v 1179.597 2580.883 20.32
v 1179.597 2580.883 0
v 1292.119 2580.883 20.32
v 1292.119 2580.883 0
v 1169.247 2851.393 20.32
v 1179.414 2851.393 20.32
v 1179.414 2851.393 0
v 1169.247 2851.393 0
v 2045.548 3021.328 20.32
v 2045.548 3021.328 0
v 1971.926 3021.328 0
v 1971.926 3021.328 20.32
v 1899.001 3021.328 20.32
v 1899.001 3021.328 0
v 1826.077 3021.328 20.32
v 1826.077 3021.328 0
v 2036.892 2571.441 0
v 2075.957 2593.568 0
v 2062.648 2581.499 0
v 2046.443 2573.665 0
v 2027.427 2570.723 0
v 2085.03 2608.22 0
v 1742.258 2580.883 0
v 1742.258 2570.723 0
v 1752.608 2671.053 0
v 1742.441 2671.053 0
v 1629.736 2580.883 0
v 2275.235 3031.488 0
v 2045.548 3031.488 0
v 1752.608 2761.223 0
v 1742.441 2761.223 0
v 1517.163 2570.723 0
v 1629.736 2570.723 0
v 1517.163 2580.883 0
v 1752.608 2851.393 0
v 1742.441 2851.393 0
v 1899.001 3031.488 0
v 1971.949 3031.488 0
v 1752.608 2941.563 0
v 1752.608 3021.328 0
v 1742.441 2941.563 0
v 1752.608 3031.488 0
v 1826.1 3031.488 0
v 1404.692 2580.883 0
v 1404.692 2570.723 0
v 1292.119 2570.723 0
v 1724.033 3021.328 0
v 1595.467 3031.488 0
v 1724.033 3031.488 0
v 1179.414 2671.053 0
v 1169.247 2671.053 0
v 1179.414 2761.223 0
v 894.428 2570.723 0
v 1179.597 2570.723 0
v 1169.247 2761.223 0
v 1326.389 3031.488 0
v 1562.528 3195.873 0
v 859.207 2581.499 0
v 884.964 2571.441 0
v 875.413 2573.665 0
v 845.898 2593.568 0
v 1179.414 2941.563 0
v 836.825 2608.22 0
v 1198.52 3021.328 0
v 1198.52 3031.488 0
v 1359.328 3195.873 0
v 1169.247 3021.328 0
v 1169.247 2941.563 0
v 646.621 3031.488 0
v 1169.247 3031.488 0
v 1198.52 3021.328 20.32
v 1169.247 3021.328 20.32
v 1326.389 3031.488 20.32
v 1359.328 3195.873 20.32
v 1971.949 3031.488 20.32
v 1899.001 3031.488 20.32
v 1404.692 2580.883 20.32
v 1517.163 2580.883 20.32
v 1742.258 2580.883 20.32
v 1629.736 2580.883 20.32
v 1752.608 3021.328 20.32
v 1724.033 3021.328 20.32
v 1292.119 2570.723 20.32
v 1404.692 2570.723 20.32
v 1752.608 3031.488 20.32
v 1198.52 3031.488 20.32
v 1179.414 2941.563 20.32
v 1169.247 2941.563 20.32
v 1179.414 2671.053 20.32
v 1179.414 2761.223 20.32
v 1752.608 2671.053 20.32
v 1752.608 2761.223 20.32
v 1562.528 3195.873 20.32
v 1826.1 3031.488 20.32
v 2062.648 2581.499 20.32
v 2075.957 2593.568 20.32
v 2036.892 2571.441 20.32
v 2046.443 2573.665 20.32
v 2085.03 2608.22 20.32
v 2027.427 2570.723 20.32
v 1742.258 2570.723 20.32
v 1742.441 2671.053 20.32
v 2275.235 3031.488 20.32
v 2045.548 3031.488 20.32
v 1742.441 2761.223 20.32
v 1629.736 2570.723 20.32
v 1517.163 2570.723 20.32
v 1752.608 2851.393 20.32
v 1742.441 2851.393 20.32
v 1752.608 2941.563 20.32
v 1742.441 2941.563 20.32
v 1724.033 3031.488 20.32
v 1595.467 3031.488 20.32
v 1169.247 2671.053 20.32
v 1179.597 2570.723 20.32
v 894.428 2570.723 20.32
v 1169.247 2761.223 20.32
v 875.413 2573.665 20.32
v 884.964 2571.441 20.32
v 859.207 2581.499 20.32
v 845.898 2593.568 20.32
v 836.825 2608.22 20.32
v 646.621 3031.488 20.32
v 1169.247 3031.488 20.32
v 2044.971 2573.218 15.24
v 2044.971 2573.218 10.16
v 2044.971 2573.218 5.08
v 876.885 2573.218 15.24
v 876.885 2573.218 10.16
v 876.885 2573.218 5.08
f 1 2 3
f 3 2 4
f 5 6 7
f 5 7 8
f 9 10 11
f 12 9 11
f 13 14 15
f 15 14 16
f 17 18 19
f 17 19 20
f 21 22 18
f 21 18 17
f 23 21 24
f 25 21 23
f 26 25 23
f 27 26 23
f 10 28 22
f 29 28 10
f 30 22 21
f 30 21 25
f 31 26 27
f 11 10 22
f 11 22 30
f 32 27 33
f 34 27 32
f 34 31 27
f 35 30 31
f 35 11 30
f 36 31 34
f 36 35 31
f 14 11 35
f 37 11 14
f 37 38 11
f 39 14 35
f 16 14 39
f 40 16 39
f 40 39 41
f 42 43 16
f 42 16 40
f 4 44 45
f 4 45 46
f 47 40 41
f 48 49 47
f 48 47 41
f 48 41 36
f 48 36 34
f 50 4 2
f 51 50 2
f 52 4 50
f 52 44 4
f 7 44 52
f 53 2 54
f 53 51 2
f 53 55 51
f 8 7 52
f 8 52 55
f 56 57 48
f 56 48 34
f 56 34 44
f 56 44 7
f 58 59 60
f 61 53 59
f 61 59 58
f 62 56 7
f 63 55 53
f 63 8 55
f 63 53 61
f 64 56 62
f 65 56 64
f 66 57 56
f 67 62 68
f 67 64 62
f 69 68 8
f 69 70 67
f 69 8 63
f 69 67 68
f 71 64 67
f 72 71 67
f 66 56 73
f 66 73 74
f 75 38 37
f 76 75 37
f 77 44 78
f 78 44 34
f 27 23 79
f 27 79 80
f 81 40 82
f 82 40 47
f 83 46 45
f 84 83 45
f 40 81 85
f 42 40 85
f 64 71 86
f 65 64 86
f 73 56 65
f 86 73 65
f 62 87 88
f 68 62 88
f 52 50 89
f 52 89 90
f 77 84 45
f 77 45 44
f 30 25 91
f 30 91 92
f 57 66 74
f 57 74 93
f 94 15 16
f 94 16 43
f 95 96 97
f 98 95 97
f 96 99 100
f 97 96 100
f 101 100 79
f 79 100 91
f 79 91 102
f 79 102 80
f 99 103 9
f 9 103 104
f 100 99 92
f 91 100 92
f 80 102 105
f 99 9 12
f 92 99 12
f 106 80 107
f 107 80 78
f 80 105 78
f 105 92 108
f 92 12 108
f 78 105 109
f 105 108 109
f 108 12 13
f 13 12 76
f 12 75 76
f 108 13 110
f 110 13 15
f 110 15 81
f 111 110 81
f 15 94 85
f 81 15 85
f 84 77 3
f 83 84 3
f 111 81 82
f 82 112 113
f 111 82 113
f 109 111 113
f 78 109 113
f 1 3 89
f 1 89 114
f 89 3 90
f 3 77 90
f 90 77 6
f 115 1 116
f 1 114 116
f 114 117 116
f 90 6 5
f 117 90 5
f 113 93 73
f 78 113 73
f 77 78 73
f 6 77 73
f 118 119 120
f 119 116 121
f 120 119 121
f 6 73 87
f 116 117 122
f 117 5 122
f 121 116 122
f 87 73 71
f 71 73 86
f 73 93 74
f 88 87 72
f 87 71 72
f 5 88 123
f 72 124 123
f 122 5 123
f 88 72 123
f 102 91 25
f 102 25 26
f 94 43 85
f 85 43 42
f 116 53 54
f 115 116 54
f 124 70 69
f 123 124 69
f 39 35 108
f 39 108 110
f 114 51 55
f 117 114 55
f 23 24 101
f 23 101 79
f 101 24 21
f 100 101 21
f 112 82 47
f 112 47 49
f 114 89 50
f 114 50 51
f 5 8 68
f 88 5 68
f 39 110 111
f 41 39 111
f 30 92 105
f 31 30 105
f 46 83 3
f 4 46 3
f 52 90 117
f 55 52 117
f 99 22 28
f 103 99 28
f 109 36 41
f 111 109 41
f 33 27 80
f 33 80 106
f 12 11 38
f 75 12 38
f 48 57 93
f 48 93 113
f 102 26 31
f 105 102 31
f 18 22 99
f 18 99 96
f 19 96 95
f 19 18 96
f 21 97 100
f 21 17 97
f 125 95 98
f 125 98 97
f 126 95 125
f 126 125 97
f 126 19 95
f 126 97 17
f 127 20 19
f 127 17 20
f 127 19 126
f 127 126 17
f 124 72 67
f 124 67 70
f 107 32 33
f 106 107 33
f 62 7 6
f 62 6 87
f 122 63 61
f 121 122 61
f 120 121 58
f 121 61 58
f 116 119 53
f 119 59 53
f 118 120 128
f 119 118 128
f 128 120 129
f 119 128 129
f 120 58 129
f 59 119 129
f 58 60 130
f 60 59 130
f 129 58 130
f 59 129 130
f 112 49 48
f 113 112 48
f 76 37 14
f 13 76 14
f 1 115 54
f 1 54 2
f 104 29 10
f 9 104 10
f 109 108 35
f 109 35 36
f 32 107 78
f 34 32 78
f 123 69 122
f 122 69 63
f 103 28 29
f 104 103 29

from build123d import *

# Parameters (mm, degrees)
BOSS_EXTRUDE1_DEPTH      = 20.32
CUT_EXTRUDE1_START       = -20.32
CUT_EXTRUDE1_OUTLINE_W   = 112.522
CUT_EXTRUDE1_OUTLINE_H   = 10.16
CUT_EXTRUDE1_OUTLINE_W_2 = 112.4712
CUT_EXTRUDE1_DEPTH       = 20.32
SKETCH3_W                = 10.166490401
SKETCH3_H                = 90.17
SKETCH3_W_2              = 29.273269095
SKETCH3_H_2              = 10.16
SKETCH3_W_3              = 28.575
CUT_EXTRUDE2_DEPTH       = 1125.982


# Read off the part's stored shape, not the designer's step: Cut-Extrude1
with BuildPart() as part:
    # Sketch1 → Boss-Extrude1 (new body)
    with BuildSketch(Plane.XY):
        Polygon((1595.466660195, 3031.488204655), (1326.388576611, 3031.488204655), (1359.327618403, 3195.873483514), (1562.527618403, 3195.873483514), align=None)
        with BuildLine():
            Line((894.428066471, 2570.722953846), (2027.427046989, 2570.722953846))
            add(Edge.make_bspline(
                [(2085.030207364, 2608.219614395), (2082.704936523, 2602.979434666), (2079.555914944, 2597.842123597), (2071.701679737, 2588.506915395), (2066.997802899, 2584.31975945), (2056.553975566, 2577.521356648), (2050.823670006, 2574.916388157), (2039.117489861, 2571.518756347), (2033.151956819, 2570.722953846), (2027.427046989, 2570.722953846)],
                knots=[0, 0, 0, 0, 0.25, 0.25, 0.5, 0.5, 0.75, 0.75, 1, 1, 1, 1], degree=3))
            Line((2085.030207364, 2608.219614395), (2275.234550162, 3031.488204655))
            Line((2275.234550162, 3031.488204655), (646.620686644, 3031.488204655))
            Line((646.620686644, 3031.488204655), (836.825029442, 2608.219614395))
            add(Edge.make_bspline(
                [(836.825029442, 2608.219614395), (839.150300283, 2602.979434666), (842.299321863, 2597.842123597), (850.153557069, 2588.506915395), (854.857433907, 2584.31975945), (865.30126124, 2577.521356648), (871.0315668, 2574.916388157), (882.737746945, 2571.518756347), (888.703279987, 2570.722953846), (894.428066471, 2570.722953846)],
                knots=[0, 0, 0, 0, 0.25, 0.25, 0.5, 0.5, 0.75, 0.75, 1, 1, 1, 1], degree=3))
        make_face()
    extrude(amount=BOSS_EXTRUDE1_DEPTH)

    # Cut-Extrude1 outline → Cut-Extrude1 (cut)
    with BuildSketch(Plane.XY.offset(20.32).offset(CUT_EXTRUDE1_START)):
        Polygon((1629.735958734, 2580.882920539), (1629.73595673, 2570.722953846), (1742.25795673, 2570.722953846), (1742.257958734, 2580.882898338), align=None)
        with Locations((1235.85815673, 2575.802953846)):
            Rectangle(CUT_EXTRUDE1_OUTLINE_W, CUT_EXTRUDE1_OUTLINE_H)
        with Locations((1460.92755673, 2575.802953846)):
            Rectangle(CUT_EXTRUDE1_OUTLINE_W_2, CUT_EXTRUDE1_OUTLINE_H)
    extrude(amount=CUT_EXTRUDE1_DEPTH, mode=Mode.SUBTRACT)

    # Sketch3 → Cut-Extrude2 (cut)
    with BuildSketch(Plane(origin=(0, 0, 0), x_dir=(-1, 0, 0), z_dir=(0, 0, -1))):
        with Locations((-1174.33046881, 2716.137953846)):
            Rectangle(SKETCH3_W, SKETCH3_H)
        with Locations((-1174.33046881, 2896.477953846)):
            Rectangle(SKETCH3_W, SKETCH3_H)
        with Locations((-1183.883858158, 3026.408204655)):
            Rectangle(SKETCH3_W_2, SKETCH3_H_2)
        with Locations((-1738.320389849, 3026.408204655)):
            Rectangle(SKETCH3_W_3, SKETCH3_H_2)
        with Locations((-1747.524644649, 2896.477953846)):
            Rectangle(SKETCH3_W, SKETCH3_H)
        with Locations((-1747.524644649, 2716.137953846)):
            Rectangle(SKETCH3_W, SKETCH3_H)
        Polygon((-1826.076531052, 3021.328204655), (-1826.099732345, 3031.488204655), (-1899.001104211, 3031.488204655), (-1899.001104211, 3021.328204655), align=None)
        Polygon((-2045.548278228, 3031.488204655), (-2045.548278228, 3021.328204655), (-1971.92567737, 3021.328204655), (-1971.948878664, 3031.488204655), align=None)
    extrude(amount=-CUT_EXTRUDE2_DEPTH, mode=Mode.SUBTRACT)


solid = part.part
